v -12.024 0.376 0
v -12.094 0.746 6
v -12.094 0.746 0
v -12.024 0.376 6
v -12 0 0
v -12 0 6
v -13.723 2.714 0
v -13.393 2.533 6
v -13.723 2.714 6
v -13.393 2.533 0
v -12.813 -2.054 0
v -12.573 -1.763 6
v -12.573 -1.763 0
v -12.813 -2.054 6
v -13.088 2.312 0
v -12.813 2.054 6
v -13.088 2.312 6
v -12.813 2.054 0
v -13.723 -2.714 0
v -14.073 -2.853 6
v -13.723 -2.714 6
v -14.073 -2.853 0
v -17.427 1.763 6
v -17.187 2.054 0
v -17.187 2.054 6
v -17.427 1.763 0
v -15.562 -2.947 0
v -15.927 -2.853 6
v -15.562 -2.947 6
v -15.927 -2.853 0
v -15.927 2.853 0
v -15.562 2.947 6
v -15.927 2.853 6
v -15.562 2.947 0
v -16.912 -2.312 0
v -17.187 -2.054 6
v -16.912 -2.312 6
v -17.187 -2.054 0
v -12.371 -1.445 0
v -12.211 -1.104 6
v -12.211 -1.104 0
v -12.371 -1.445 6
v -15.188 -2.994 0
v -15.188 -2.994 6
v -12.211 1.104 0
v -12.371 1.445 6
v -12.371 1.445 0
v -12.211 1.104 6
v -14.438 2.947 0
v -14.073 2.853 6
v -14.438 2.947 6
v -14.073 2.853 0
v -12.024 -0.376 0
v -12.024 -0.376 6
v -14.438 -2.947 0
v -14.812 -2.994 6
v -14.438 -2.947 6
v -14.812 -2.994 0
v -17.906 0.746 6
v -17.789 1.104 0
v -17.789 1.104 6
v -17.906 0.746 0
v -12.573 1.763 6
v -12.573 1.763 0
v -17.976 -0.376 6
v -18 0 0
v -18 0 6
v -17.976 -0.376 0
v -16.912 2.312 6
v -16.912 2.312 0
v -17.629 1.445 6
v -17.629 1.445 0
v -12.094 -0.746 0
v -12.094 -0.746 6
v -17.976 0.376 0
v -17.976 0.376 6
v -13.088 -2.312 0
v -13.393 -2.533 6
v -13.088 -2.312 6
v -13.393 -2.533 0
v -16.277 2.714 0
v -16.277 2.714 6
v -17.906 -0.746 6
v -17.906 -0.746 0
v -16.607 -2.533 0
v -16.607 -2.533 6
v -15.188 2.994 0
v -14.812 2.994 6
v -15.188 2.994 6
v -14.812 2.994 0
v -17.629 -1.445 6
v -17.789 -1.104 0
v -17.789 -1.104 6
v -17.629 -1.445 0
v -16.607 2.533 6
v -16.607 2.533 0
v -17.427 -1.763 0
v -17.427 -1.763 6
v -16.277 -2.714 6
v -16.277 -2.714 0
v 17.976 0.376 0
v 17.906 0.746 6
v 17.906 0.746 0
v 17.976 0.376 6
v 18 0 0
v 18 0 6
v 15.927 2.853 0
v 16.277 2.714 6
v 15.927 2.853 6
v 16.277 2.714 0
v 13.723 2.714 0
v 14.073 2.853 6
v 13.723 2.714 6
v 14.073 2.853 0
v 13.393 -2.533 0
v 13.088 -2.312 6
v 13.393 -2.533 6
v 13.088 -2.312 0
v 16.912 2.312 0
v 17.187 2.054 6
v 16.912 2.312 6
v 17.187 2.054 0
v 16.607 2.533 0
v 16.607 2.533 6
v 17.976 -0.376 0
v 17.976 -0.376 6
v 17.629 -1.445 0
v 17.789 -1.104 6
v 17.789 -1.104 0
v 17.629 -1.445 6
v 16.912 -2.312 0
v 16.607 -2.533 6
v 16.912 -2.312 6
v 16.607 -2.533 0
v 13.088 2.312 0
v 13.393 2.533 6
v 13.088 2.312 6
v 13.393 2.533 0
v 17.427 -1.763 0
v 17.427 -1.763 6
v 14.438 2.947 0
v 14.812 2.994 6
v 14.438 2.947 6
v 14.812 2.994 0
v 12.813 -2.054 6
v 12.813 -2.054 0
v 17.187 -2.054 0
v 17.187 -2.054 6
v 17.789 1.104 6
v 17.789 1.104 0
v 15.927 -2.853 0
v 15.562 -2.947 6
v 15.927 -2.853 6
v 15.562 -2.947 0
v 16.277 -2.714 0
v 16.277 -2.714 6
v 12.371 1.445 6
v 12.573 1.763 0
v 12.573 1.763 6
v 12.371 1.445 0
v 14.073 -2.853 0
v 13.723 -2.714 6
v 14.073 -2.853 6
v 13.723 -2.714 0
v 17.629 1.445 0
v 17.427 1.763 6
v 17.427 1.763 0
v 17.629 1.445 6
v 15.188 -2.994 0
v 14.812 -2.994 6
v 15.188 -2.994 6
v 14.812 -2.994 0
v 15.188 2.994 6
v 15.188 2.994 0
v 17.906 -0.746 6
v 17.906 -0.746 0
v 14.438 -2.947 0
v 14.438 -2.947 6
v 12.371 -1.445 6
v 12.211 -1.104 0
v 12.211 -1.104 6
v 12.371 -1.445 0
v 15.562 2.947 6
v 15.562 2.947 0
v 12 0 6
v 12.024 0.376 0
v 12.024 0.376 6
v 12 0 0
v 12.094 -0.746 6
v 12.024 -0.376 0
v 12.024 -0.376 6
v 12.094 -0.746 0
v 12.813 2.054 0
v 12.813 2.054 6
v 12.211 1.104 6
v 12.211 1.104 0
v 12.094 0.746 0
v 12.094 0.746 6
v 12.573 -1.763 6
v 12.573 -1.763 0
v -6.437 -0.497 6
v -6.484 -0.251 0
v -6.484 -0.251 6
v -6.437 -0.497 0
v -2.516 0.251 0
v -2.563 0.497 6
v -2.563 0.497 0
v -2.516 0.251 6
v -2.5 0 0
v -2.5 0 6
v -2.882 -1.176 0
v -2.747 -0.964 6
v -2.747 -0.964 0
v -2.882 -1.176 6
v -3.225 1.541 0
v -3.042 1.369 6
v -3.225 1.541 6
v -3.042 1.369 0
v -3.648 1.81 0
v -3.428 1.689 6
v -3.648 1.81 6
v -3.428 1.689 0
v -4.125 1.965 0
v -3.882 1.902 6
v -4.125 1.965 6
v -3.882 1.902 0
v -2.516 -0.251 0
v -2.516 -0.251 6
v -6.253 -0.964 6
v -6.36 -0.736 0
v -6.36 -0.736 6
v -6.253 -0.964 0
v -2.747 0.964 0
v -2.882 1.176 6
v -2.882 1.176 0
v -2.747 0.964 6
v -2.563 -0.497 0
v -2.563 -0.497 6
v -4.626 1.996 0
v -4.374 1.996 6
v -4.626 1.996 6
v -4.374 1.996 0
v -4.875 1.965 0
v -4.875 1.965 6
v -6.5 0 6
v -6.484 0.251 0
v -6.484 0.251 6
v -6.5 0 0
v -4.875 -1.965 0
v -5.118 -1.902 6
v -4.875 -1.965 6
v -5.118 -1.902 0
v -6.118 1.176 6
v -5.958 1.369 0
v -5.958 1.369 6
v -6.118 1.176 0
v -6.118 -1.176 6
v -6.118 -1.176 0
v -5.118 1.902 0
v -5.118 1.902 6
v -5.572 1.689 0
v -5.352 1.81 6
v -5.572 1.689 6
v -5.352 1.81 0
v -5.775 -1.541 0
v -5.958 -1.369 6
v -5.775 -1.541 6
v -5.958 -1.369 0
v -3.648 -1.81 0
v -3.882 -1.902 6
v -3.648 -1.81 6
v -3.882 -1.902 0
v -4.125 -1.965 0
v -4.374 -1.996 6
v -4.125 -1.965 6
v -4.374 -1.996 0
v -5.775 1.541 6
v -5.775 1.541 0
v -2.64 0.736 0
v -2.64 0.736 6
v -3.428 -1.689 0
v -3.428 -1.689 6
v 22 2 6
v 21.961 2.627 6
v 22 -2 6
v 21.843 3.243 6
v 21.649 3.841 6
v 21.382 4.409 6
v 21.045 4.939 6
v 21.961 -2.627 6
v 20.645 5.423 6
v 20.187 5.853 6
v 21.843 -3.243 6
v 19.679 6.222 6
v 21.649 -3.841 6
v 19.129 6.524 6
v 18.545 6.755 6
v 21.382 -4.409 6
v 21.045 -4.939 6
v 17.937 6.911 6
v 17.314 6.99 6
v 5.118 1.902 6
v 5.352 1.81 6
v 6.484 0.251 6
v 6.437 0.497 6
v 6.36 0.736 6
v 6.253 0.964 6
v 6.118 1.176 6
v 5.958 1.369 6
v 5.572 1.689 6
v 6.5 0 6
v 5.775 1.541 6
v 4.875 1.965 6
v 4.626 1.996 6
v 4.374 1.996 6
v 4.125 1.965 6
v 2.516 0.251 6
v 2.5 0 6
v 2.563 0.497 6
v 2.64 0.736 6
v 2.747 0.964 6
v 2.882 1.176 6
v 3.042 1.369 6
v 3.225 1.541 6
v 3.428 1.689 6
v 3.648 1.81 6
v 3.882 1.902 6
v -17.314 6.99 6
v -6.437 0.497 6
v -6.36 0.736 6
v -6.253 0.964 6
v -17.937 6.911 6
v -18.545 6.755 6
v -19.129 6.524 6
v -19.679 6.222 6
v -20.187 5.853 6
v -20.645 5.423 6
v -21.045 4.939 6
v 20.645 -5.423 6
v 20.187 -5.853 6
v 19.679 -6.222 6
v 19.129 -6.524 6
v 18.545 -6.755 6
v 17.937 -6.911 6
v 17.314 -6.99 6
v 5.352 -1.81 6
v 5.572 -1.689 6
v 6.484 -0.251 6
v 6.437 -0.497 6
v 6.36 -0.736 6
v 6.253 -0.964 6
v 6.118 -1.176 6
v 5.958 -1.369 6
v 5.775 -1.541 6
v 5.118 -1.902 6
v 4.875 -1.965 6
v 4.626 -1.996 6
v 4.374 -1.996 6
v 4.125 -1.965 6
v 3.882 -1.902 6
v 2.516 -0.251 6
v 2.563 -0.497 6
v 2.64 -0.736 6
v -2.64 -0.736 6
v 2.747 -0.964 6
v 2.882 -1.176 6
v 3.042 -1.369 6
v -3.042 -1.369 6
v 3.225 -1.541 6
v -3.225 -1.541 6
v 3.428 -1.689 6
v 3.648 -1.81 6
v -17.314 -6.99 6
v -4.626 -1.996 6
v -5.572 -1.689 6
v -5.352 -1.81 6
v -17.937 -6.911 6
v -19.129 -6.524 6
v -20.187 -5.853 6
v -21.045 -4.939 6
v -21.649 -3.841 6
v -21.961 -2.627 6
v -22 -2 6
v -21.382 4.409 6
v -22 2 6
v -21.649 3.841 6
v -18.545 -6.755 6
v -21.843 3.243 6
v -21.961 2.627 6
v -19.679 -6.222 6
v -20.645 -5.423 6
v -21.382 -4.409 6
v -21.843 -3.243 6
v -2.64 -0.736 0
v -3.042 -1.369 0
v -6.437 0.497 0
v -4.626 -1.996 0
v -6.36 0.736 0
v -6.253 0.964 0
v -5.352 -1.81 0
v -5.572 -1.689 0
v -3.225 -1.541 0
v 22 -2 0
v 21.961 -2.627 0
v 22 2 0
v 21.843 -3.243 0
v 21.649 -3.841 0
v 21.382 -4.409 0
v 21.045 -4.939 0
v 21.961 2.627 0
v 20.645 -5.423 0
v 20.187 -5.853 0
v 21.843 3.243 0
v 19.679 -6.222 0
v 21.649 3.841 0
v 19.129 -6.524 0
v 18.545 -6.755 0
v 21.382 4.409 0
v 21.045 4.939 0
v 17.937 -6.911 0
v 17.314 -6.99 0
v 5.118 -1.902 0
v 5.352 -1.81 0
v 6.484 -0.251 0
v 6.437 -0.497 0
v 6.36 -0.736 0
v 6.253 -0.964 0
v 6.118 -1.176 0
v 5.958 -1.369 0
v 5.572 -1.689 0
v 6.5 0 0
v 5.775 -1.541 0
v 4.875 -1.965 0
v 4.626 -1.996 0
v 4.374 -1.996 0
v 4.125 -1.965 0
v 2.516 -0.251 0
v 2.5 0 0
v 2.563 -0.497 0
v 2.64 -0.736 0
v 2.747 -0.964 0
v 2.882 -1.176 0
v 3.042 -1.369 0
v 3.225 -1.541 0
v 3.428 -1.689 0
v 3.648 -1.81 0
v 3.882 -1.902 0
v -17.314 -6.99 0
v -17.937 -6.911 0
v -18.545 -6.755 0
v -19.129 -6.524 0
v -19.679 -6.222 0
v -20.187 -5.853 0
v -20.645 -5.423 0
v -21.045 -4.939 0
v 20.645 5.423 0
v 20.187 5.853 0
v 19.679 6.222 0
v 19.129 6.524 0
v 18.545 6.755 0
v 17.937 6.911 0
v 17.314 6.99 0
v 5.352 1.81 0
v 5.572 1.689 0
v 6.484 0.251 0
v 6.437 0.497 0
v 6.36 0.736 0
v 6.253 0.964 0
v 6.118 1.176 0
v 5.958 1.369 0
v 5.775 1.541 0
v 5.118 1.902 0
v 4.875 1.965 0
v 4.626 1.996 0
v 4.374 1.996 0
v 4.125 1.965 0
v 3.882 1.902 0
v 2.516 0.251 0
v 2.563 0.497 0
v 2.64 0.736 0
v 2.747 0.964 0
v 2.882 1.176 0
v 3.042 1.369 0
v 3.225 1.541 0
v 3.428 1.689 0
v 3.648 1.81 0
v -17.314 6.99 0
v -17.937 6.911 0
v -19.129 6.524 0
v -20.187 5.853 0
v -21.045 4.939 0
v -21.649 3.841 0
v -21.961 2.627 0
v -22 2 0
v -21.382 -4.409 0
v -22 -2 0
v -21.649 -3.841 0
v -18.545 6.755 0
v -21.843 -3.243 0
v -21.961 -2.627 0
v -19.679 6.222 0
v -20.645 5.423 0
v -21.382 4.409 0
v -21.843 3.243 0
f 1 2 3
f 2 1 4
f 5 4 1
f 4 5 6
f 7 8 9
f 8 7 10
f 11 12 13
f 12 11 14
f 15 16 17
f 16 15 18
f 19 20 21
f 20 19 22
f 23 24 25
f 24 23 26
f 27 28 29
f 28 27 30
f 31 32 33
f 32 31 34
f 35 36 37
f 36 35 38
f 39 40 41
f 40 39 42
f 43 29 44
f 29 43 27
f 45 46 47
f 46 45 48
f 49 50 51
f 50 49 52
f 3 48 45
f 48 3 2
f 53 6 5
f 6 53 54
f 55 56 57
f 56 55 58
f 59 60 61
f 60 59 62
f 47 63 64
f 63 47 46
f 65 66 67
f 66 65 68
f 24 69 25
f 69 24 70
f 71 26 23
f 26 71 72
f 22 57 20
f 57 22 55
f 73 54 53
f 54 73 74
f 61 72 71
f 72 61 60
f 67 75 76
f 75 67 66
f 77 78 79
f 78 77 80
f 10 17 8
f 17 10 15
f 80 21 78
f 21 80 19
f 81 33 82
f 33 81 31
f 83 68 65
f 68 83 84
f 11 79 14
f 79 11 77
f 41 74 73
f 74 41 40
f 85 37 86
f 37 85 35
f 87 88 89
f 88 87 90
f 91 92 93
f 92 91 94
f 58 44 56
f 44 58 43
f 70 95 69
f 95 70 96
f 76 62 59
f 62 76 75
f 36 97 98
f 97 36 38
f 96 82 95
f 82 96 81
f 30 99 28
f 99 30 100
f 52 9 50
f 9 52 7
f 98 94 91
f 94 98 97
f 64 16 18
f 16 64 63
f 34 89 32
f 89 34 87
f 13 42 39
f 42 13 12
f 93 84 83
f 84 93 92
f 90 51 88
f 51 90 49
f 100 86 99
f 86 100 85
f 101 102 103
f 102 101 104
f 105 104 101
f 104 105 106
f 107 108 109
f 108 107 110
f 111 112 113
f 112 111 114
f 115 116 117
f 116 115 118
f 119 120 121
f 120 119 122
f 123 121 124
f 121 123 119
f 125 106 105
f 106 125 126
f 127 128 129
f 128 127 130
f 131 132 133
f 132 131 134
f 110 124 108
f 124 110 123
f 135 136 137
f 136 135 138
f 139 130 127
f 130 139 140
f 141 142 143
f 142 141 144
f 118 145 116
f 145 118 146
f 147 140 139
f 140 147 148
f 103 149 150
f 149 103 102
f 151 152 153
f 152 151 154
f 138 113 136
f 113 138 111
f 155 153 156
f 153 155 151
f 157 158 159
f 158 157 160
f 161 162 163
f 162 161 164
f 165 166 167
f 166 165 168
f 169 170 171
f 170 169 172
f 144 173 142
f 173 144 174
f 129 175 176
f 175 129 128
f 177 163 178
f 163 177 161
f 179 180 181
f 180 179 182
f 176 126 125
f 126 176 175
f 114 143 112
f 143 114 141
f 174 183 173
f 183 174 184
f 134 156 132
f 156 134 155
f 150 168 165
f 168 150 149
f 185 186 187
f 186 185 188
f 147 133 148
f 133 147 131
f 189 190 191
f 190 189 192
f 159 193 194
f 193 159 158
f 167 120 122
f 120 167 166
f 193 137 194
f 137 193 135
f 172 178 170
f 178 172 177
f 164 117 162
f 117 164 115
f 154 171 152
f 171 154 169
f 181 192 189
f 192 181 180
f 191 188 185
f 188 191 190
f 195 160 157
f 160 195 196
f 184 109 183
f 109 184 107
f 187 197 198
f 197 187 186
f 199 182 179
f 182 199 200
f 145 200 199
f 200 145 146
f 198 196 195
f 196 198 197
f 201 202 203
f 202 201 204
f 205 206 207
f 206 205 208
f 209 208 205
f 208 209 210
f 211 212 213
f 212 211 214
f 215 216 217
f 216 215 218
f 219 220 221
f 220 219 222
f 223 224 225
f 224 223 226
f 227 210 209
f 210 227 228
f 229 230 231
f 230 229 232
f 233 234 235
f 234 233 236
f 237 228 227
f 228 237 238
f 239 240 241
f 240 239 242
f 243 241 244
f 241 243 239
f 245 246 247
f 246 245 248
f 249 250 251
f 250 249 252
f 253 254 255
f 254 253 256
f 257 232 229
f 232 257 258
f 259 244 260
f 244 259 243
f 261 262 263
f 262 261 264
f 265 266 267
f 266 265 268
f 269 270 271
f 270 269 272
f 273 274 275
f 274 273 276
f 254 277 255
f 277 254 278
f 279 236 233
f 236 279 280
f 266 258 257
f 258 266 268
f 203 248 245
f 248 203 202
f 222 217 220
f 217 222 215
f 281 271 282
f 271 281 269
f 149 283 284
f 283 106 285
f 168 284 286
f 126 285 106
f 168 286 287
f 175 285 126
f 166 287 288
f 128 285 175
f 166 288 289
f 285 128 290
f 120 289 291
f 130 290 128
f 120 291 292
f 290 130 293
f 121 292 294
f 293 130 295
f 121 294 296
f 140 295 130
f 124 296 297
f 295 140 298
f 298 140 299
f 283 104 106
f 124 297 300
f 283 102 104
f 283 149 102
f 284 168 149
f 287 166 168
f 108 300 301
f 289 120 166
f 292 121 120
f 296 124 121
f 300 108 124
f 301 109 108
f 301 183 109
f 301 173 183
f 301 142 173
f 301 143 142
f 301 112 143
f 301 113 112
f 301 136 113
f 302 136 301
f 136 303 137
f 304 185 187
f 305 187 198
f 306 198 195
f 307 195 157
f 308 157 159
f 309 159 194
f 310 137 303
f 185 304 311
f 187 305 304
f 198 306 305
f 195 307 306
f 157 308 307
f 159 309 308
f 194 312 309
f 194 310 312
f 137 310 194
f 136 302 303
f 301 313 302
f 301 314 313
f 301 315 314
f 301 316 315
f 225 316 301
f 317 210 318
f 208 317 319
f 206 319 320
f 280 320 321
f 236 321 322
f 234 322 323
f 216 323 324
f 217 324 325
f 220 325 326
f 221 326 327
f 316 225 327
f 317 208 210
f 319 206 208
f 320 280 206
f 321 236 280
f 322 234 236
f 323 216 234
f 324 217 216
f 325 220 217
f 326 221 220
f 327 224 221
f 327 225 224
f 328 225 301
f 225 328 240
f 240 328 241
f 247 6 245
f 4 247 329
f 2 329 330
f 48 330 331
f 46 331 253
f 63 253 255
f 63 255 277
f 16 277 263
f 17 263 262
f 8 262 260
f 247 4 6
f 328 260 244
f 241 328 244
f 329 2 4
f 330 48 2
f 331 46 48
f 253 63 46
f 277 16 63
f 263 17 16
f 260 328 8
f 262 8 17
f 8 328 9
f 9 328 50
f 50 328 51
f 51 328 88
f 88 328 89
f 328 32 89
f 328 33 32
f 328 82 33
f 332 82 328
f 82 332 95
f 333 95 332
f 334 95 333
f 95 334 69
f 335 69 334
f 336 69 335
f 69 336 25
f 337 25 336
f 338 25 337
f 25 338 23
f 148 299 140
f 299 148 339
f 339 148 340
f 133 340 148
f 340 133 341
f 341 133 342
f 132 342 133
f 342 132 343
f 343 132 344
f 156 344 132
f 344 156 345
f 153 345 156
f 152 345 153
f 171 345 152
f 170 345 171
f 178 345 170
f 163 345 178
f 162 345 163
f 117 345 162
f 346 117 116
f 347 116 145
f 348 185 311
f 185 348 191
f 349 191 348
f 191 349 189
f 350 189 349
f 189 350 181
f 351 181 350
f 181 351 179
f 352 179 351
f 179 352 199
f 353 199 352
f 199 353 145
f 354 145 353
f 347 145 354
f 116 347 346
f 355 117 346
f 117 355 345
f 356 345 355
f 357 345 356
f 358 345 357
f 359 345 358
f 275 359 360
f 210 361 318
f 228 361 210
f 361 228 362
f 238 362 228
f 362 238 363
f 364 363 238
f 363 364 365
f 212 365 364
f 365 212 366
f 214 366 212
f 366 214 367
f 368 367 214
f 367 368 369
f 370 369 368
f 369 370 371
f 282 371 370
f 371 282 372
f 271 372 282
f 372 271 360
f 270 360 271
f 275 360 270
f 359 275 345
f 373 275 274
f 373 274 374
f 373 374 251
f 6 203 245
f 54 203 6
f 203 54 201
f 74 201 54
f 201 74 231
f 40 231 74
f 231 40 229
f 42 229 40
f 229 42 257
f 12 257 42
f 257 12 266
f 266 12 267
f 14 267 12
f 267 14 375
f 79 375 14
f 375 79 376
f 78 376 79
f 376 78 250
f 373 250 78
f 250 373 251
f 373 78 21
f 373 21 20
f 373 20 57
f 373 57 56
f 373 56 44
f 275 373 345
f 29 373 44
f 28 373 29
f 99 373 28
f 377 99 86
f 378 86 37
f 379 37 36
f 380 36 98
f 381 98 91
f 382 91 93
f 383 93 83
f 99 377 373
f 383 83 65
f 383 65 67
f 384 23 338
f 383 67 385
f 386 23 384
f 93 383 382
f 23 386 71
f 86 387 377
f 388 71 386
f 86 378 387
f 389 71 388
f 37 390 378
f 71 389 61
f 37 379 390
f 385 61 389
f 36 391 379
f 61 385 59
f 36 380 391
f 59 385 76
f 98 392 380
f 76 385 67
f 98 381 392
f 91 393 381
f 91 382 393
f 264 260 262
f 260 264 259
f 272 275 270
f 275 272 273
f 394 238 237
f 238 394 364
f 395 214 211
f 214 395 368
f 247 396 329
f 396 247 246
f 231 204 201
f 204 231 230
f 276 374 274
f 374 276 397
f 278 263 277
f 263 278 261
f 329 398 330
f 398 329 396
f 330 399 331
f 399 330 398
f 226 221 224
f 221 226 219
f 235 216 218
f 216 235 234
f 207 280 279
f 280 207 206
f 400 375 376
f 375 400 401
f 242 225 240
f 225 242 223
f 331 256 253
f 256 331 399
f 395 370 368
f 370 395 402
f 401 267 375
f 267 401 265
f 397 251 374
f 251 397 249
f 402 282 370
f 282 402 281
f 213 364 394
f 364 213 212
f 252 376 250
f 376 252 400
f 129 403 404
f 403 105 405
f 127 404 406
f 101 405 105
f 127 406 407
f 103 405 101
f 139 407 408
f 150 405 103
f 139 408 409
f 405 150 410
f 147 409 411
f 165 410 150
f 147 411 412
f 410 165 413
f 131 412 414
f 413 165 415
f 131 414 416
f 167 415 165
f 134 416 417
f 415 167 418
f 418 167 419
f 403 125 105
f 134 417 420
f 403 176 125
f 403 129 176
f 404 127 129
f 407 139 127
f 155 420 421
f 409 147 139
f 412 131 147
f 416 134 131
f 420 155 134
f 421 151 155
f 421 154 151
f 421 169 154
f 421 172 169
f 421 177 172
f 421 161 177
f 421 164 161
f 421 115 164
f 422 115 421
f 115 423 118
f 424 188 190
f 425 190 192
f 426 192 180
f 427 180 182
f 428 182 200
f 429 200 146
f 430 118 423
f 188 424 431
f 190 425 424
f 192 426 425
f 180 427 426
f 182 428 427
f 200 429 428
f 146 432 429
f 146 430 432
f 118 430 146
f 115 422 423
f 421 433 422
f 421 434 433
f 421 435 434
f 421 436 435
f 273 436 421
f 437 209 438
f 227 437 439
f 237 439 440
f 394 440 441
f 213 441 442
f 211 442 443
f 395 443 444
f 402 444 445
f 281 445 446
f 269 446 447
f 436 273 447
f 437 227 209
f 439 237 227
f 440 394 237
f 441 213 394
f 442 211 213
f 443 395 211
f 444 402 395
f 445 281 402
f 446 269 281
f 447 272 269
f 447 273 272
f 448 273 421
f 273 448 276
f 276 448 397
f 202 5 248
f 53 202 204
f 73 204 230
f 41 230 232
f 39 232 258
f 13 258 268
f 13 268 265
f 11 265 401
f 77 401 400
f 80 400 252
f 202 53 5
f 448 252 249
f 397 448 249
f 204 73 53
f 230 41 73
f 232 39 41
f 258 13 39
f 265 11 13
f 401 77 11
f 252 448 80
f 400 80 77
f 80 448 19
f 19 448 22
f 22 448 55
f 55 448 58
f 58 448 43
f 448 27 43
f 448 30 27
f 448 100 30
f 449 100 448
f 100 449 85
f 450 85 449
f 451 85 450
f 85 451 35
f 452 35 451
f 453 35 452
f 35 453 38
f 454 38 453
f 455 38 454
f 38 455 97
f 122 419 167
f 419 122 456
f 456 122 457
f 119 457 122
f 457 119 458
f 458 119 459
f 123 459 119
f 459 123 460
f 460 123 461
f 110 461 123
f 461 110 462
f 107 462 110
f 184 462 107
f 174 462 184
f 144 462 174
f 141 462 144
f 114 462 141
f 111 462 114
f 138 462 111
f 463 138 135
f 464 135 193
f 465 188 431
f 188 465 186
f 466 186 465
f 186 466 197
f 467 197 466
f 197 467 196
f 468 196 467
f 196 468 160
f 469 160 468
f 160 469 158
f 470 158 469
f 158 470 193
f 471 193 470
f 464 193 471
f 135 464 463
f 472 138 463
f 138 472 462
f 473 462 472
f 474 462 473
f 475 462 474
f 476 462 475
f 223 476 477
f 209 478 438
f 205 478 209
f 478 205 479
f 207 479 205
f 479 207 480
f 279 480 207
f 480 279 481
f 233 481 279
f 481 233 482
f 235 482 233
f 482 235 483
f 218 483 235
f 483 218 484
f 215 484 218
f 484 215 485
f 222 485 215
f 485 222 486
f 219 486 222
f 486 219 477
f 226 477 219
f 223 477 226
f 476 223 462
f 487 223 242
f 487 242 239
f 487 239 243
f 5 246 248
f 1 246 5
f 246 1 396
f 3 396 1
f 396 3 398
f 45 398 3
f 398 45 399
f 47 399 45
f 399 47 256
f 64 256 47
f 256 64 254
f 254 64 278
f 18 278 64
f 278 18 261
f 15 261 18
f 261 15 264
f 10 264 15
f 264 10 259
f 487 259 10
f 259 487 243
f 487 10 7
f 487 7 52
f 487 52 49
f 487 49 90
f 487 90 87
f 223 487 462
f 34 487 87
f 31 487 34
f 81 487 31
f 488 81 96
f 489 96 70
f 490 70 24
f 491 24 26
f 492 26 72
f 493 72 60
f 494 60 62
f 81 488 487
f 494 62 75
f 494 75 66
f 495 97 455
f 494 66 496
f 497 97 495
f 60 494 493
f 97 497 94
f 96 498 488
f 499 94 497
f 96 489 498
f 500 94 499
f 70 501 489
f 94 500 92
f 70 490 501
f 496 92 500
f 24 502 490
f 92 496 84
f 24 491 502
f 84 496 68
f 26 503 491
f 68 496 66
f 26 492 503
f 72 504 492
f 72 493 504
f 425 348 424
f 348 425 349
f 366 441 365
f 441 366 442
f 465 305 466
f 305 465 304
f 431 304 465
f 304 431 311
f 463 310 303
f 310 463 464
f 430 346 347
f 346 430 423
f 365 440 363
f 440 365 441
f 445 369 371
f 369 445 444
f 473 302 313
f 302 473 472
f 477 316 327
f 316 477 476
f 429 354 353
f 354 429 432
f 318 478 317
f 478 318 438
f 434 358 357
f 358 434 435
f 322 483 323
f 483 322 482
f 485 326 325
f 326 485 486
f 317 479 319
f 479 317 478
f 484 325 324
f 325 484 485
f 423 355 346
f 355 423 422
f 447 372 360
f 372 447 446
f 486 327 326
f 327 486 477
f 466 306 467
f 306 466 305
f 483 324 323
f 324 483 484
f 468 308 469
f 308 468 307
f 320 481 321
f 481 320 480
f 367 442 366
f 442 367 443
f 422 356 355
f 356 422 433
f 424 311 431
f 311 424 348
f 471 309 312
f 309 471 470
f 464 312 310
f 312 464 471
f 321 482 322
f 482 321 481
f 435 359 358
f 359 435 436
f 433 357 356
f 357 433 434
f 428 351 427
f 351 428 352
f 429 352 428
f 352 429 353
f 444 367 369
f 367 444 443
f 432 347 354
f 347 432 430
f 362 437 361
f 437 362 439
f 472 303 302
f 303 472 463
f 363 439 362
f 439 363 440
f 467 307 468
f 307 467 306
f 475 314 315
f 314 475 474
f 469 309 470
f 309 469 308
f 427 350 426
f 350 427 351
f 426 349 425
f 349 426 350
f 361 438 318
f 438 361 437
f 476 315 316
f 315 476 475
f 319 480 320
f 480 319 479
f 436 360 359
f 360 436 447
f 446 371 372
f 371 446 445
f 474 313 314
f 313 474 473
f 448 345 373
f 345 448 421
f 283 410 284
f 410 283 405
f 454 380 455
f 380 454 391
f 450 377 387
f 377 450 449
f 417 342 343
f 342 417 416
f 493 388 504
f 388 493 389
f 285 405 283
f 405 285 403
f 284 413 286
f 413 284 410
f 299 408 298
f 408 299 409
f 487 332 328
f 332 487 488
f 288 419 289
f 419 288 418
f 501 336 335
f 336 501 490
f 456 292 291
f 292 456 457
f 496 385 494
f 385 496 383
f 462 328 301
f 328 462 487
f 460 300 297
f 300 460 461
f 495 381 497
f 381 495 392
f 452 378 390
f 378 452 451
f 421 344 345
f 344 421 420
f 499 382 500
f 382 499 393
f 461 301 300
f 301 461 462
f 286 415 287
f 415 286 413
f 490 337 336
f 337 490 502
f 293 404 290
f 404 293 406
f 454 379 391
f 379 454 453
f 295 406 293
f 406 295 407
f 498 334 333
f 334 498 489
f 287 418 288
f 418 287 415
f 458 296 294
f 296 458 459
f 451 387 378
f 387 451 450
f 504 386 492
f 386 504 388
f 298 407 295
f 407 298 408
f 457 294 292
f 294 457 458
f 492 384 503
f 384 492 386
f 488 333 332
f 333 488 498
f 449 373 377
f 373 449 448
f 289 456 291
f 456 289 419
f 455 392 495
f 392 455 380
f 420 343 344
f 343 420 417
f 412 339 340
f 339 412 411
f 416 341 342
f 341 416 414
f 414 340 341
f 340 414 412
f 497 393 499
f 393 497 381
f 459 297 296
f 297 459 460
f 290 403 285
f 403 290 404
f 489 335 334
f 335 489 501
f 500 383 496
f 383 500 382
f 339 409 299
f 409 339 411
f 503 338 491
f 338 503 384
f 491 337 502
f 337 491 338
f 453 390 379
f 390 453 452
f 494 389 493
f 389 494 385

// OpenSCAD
$fn = 50;


difference() {
	union() {
		hull() {
			translate(v = [-17.0000000000, 2.0000000000, 0]) {
				cylinder(h = 6, r = 5);
			}
			translate(v = [17.0000000000, 2.0000000000, 0]) {
				cylinder(h = 6, r = 5);
			}
			translate(v = [-17.0000000000, -2.0000000000, 0]) {
				cylinder(h = 6, r = 5);
			}
			translate(v = [17.0000000000, -2.0000000000, 0]) {
				cylinder(h = 6, r = 5);
			}
		}
	}
	union() {
		#translate(v = [-15.0000000000, 0.0000000000, 0]) {
			cylinder(h = 6, r = 3.0000000000);
		}
		#translate(v = [15.0000000000, 0.0000000000, 0]) {
			cylinder(h = 6, r = 3.0000000000);
		}
		#translate(v = [-15.0000000000, 0.0000000000, -100.0000000000]) {
			cylinder(h = 200, r = 3.0000000000);
		}
		#translate(v = [-15.0000000000, 0.0000000000, -100.0000000000]) {
			cylinder(h = 200, r = 3.0000000000);
		}
		#translate(v = [15.0000000000, 0.0000000000, -100.0000000000]) {
			cylinder(h = 200, r = 3.0000000000);
		}
		#translate(v = [15.0000000000, 0.0000000000, -100.0000000000]) {
			cylinder(h = 200, r = 3.0000000000);
		}
		#translate(v = [-15.0000000000, 0.0000000000, 0]) {
			cylinder(h = 6, r = 1.5000000000);
		}
		#translate(v = [15.0000000000, 0.0000000000, 0]) {
			cylinder(h = 6, r = 1.5000000000);
		}
		#translate(v = [-15.0000000000, 0.0000000000, 0]) {
			cylinder(h = 6, r = 1.5000000000);
		}
		#translate(v = [15.0000000000, 0.0000000000, 0]) {
			cylinder(h = 6, r = 1.5000000000);
		}
		#translate(v = [-15.0000000000, 0.0000000000, 0]) {
			cylinder(h = 6, r = 1.5000000000);
		}
		#translate(v = [15.0000000000, 0.0000000000, 0]) {
			cylinder(h = 6, r = 1.5000000000);
		}
		#translate(v = [-4.5000000000, 0, 0]) {
			cylinder(h = 6, r = 2.0000000000);
		}
		#translate(v = [4.5000000000, 0, 0]) {
			cylinder(h = 6, r = 2.0000000000);
		}
	}
}
